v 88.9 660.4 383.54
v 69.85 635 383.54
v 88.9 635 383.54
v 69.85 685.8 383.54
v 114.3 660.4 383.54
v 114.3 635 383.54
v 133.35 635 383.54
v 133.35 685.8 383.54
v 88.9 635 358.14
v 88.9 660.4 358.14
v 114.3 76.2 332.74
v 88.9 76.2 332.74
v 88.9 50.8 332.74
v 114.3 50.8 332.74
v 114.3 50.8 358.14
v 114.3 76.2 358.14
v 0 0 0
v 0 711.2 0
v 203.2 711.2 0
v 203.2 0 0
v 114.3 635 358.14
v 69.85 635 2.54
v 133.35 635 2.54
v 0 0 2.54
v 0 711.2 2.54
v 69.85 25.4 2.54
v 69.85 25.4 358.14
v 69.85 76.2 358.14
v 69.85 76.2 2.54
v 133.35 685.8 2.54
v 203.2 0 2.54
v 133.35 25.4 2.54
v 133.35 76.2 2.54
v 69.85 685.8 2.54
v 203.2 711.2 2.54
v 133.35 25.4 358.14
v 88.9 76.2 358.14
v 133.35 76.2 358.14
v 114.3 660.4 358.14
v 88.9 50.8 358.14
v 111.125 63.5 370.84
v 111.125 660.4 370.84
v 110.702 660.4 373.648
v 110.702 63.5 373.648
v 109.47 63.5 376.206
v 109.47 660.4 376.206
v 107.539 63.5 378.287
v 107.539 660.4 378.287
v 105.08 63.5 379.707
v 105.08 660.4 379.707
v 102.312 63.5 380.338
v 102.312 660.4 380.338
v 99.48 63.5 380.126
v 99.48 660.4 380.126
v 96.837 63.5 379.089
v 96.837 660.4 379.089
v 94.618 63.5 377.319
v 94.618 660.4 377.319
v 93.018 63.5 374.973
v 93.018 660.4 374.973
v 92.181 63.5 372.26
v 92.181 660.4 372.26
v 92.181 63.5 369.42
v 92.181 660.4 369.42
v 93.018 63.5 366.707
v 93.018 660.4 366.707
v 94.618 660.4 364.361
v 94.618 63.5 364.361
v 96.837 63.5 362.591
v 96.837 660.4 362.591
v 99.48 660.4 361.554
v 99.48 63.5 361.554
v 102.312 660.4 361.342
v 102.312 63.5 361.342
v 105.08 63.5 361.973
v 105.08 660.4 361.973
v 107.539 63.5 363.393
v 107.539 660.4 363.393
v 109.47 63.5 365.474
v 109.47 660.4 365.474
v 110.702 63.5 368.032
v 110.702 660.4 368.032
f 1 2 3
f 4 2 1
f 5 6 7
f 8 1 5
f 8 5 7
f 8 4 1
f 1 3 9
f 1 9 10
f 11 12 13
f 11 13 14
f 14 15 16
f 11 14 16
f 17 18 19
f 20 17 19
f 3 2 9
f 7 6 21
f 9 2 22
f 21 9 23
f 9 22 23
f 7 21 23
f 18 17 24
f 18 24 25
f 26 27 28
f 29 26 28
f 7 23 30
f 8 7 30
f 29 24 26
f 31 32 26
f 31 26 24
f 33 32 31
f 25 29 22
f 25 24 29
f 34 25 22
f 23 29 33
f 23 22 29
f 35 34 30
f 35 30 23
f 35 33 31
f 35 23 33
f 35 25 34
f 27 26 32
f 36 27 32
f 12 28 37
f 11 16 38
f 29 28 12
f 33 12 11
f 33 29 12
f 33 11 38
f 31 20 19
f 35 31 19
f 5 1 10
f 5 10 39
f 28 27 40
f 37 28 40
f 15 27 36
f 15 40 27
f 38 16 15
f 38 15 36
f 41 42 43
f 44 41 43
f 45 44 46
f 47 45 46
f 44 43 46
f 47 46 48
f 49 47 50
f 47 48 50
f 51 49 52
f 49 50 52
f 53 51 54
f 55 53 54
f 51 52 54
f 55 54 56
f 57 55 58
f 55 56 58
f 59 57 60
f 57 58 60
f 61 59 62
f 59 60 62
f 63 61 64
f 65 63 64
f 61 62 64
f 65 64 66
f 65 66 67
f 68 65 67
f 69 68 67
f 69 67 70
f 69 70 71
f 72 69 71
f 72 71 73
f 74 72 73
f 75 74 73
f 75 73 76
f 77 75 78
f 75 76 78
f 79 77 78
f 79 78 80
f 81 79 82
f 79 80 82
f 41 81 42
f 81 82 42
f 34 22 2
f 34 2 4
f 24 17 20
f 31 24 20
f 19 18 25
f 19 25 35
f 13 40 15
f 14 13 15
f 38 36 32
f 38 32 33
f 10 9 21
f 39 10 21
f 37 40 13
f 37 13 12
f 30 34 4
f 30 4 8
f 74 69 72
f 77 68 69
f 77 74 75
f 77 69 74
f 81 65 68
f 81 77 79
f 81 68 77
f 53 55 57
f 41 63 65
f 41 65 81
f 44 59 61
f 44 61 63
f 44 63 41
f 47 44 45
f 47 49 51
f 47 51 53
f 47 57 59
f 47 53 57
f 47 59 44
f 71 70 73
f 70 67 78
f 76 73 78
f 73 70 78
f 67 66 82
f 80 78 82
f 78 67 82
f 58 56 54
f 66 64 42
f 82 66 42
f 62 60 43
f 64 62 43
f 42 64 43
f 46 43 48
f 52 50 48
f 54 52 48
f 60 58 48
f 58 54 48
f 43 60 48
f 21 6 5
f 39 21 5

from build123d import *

# Parameters (mm, degrees)
F0_W      = 203.2
F0_H      = 711.2
F1_DEPTH  = 2.54
F2_W      = 63.5
F2_H      = 50.8
F3_DEPTH  = 355.6
F4_DEPTH  = 381
F5_W      = 25.4
F5_H      = 25.4
F6_DEPTH  = 25.4
F7_W      = 25.4
F7_H      = 25.4
F8_DEPTH  = 25.4
F9_R      = 9.525
F10_DEPTH = 596.9


with BuildPart() as f1:
    # F0 (on Top) → F1 (new body)
    with BuildSketch(Plane.XY):
        with Locations((101.6, 355.6)):
            Rectangle(F0_W, F0_H)
    extrude(amount=F1_DEPTH)

    # F2 (on face) → F3 (join)
    with BuildSketch(Plane.XY.offset(2.54)):
        with Locations((101.6, 50.8)):
            Rectangle(F2_W, F2_H)
    extrude(amount=F3_DEPTH)

    # F2 (on face) → F4 (join)
    with BuildSketch(Plane.XY.offset(2.54)):
        with Locations((101.6, 660.4)):
            Rectangle(F2_W, F2_H)
    extrude(amount=F4_DEPTH)

    # F5 (on face) → F6 (cut)
    with BuildSketch(Plane.XY.offset(358.14)):
        with Locations((101.6, 63.5)):
            Rectangle(F5_W, F5_H)
    extrude(amount=-F6_DEPTH, mode=Mode.SUBTRACT)

    # F7 (on face) → F8 (cut)
    with BuildSketch(Plane.XY.offset(383.54)):
        with Locations((101.6, 647.7)):
            Rectangle(F7_W, F7_H)
    extrude(amount=-F8_DEPTH, mode=Mode.SUBTRACT)


with BuildPart() as f10:
    # F9 (on face) → F10 (new body)
    with BuildSketch(Plane.XZ.offset(-660.4)):
        with Locations((101.6, 370.84)):
            Circle(F9_R)
    extrude(amount=F10_DEPTH)


solid = Compound([f1.part, f10.part])
